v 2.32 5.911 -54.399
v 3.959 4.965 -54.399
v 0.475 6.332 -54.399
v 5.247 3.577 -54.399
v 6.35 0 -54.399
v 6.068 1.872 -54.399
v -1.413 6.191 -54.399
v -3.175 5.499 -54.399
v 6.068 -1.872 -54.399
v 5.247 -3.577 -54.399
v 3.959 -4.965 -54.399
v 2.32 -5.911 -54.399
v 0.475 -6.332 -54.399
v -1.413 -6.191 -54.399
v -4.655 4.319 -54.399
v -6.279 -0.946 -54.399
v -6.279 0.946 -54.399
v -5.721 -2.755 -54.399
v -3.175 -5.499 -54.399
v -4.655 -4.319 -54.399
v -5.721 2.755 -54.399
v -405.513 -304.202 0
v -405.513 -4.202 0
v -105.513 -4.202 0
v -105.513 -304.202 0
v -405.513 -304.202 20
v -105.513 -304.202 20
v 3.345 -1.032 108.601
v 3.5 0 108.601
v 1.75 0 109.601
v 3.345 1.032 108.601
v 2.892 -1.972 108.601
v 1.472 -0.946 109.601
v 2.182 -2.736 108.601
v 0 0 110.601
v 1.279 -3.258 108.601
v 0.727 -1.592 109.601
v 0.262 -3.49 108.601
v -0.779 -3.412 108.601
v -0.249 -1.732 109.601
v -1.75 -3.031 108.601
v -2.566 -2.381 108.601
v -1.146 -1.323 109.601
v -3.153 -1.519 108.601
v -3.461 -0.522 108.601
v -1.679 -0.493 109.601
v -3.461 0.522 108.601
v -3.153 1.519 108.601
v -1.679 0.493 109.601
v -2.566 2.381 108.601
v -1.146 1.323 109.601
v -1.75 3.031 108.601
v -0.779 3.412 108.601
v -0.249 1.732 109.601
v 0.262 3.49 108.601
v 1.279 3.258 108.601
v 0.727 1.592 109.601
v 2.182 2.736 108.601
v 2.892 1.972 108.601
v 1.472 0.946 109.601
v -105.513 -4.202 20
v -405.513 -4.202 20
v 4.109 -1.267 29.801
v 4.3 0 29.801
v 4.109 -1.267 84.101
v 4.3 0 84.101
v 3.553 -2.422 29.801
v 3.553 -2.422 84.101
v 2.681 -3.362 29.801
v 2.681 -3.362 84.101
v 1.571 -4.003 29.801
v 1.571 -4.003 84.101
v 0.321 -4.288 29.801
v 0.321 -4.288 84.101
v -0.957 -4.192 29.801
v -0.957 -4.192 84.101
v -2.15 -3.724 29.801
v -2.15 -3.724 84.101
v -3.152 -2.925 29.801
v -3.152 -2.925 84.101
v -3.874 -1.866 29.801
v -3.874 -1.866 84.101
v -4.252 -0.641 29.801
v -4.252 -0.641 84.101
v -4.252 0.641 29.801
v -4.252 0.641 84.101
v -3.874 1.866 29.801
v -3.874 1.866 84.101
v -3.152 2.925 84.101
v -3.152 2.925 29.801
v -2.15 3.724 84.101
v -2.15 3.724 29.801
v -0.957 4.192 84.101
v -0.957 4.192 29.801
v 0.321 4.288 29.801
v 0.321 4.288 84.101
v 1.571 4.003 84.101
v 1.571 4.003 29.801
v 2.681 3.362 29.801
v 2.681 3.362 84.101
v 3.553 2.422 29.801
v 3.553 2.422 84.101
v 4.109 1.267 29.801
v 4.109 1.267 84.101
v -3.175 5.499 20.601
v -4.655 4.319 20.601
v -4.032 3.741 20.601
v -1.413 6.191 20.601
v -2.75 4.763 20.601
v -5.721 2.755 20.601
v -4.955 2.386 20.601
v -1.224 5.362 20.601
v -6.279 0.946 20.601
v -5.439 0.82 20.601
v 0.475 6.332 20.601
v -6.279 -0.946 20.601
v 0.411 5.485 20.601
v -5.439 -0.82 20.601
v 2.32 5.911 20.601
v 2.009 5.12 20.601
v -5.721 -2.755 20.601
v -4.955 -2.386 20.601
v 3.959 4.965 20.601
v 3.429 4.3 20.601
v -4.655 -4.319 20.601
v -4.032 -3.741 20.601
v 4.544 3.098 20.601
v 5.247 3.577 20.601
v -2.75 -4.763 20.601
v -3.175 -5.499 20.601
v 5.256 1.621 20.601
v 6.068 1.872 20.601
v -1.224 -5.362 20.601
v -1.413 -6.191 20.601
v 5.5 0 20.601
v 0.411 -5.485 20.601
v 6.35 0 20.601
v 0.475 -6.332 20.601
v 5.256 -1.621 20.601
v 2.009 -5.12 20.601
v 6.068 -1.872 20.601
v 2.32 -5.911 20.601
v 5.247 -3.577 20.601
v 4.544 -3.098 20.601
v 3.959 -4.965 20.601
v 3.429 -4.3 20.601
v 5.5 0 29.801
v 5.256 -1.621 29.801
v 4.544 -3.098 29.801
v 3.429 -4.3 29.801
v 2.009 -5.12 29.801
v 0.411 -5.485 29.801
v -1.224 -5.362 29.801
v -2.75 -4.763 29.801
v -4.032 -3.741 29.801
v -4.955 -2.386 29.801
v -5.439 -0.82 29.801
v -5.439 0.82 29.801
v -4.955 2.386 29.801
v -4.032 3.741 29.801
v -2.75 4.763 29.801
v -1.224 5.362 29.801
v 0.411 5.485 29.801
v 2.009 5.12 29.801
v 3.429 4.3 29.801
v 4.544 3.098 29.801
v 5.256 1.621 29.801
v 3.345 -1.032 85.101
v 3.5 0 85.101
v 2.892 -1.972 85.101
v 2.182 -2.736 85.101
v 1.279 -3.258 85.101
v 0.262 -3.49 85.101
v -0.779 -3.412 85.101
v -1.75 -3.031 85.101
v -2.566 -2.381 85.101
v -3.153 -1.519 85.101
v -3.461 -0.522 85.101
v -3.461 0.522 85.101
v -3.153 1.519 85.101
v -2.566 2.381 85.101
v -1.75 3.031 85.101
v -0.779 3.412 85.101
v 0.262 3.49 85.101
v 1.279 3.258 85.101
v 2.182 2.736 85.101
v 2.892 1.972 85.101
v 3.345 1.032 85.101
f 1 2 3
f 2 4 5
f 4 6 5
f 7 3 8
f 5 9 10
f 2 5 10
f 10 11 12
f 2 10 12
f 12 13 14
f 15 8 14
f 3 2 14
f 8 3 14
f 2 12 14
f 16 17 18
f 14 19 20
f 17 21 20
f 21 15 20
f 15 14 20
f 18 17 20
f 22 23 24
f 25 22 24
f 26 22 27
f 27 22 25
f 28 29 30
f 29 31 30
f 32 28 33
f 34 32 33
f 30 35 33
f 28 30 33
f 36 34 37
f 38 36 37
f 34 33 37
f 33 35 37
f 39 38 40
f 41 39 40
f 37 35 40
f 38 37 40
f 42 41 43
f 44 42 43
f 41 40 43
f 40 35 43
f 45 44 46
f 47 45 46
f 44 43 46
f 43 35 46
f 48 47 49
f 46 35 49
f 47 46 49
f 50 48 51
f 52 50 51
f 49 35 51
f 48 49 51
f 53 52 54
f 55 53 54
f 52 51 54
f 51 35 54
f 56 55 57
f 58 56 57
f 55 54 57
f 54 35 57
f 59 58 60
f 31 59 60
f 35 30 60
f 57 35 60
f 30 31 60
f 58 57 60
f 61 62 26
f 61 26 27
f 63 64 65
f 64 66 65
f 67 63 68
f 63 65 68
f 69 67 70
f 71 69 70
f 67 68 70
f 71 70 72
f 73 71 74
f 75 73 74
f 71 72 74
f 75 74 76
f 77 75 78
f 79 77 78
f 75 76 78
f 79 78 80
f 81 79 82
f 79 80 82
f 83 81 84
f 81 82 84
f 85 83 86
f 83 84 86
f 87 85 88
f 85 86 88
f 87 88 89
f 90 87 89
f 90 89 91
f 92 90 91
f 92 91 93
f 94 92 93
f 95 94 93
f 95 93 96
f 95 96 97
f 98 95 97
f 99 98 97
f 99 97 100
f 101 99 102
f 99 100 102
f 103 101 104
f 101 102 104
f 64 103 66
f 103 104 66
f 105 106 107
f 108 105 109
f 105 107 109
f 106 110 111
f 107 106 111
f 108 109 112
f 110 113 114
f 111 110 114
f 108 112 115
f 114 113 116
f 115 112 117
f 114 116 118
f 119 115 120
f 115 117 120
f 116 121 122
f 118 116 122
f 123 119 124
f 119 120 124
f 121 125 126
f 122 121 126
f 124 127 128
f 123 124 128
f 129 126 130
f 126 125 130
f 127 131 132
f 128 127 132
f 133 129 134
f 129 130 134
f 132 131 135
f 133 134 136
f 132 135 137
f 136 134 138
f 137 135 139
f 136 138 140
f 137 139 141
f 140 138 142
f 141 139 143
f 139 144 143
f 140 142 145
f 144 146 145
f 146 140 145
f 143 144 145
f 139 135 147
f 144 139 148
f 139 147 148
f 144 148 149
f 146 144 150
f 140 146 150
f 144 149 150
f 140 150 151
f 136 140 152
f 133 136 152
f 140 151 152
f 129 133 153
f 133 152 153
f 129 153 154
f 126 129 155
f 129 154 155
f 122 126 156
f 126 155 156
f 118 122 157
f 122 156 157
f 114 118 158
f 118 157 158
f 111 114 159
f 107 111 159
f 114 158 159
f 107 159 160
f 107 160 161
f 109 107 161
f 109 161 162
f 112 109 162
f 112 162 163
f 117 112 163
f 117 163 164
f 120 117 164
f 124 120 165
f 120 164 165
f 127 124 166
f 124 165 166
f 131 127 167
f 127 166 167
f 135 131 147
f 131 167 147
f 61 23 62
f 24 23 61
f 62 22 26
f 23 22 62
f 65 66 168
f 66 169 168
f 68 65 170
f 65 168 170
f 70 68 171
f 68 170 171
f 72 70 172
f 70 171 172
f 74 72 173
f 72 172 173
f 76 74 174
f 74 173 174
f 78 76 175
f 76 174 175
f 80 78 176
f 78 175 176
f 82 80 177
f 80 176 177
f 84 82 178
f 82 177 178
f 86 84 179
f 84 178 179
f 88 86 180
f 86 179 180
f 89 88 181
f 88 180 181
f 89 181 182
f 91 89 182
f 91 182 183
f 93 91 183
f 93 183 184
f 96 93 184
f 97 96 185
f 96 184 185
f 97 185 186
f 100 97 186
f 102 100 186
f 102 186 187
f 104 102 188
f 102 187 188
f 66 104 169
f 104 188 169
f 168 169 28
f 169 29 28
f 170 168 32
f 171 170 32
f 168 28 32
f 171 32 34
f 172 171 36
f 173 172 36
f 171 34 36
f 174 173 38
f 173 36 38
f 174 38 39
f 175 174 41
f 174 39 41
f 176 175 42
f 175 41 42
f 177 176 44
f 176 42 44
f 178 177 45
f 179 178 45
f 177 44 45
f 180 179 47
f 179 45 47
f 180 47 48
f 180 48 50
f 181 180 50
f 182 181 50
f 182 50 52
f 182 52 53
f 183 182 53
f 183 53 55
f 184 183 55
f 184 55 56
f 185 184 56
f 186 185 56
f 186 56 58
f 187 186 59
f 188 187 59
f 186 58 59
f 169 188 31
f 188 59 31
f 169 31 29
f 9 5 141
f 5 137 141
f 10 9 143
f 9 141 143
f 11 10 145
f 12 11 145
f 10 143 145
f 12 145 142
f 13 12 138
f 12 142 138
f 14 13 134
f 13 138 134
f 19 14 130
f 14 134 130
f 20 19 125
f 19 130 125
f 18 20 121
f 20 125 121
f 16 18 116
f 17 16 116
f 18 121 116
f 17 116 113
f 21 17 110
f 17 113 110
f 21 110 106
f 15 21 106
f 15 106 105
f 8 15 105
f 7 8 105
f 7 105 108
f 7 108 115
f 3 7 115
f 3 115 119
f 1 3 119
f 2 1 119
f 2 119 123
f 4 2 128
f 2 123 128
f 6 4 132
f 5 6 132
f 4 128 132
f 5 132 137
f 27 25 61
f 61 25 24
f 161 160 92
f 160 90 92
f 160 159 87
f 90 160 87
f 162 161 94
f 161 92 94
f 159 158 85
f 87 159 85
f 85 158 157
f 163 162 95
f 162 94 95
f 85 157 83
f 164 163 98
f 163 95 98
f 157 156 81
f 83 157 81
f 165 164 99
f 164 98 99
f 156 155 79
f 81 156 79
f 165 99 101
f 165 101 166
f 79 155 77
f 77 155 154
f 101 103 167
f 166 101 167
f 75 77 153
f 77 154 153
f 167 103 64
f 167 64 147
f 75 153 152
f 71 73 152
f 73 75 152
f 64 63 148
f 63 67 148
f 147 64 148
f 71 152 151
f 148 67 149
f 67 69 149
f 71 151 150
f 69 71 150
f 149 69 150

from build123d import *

# Parameters (mm, degrees)
F2_W     = 300
F2_H     = 300
F3_DEPTH = 20
F4_DEPTH = 13


# Not quite as in the source:
# - a feature names something its author has since deleted; it is built from what else it names


with BuildPart() as f1:
    # F0 (on Front) → F1 (revolve)
    with BuildSketch(Plane.XZ):
        Polygon((3.5, 108.6006758511), (0, 110.6006758511), (0, -41.3993241489), (6.35, -41.3993241489), (6.35, 20.6006758511), (5.5, 20.6006758511), (5.5, 29.8006758511), (4.3, 29.8006758511), (4.3, 84.1006758511), (3.5, 85.1006758511), align=None)
    revolve(axis=Axis((0, 0, 34.6006758511), (0, 0, -1)))

    # F4 (add): a face of the model
    f4_faces = [f1.faces().sort_by_distance(p)[0] for p in [
        (0, 0, -41.3993241489),
    ]]
    extrude(f4_faces, amount=F4_DEPTH)


with BuildPart() as f3:
    # F2 (on Top) → F3 (new body)
    with BuildSketch(Plane.XY):
        with Locations((-255.5129393935, -154.2015225627)):
            Rectangle(F2_W, F2_H)
    extrude(amount=F3_DEPTH)


solid = Compound([f1.part, f3.part])
